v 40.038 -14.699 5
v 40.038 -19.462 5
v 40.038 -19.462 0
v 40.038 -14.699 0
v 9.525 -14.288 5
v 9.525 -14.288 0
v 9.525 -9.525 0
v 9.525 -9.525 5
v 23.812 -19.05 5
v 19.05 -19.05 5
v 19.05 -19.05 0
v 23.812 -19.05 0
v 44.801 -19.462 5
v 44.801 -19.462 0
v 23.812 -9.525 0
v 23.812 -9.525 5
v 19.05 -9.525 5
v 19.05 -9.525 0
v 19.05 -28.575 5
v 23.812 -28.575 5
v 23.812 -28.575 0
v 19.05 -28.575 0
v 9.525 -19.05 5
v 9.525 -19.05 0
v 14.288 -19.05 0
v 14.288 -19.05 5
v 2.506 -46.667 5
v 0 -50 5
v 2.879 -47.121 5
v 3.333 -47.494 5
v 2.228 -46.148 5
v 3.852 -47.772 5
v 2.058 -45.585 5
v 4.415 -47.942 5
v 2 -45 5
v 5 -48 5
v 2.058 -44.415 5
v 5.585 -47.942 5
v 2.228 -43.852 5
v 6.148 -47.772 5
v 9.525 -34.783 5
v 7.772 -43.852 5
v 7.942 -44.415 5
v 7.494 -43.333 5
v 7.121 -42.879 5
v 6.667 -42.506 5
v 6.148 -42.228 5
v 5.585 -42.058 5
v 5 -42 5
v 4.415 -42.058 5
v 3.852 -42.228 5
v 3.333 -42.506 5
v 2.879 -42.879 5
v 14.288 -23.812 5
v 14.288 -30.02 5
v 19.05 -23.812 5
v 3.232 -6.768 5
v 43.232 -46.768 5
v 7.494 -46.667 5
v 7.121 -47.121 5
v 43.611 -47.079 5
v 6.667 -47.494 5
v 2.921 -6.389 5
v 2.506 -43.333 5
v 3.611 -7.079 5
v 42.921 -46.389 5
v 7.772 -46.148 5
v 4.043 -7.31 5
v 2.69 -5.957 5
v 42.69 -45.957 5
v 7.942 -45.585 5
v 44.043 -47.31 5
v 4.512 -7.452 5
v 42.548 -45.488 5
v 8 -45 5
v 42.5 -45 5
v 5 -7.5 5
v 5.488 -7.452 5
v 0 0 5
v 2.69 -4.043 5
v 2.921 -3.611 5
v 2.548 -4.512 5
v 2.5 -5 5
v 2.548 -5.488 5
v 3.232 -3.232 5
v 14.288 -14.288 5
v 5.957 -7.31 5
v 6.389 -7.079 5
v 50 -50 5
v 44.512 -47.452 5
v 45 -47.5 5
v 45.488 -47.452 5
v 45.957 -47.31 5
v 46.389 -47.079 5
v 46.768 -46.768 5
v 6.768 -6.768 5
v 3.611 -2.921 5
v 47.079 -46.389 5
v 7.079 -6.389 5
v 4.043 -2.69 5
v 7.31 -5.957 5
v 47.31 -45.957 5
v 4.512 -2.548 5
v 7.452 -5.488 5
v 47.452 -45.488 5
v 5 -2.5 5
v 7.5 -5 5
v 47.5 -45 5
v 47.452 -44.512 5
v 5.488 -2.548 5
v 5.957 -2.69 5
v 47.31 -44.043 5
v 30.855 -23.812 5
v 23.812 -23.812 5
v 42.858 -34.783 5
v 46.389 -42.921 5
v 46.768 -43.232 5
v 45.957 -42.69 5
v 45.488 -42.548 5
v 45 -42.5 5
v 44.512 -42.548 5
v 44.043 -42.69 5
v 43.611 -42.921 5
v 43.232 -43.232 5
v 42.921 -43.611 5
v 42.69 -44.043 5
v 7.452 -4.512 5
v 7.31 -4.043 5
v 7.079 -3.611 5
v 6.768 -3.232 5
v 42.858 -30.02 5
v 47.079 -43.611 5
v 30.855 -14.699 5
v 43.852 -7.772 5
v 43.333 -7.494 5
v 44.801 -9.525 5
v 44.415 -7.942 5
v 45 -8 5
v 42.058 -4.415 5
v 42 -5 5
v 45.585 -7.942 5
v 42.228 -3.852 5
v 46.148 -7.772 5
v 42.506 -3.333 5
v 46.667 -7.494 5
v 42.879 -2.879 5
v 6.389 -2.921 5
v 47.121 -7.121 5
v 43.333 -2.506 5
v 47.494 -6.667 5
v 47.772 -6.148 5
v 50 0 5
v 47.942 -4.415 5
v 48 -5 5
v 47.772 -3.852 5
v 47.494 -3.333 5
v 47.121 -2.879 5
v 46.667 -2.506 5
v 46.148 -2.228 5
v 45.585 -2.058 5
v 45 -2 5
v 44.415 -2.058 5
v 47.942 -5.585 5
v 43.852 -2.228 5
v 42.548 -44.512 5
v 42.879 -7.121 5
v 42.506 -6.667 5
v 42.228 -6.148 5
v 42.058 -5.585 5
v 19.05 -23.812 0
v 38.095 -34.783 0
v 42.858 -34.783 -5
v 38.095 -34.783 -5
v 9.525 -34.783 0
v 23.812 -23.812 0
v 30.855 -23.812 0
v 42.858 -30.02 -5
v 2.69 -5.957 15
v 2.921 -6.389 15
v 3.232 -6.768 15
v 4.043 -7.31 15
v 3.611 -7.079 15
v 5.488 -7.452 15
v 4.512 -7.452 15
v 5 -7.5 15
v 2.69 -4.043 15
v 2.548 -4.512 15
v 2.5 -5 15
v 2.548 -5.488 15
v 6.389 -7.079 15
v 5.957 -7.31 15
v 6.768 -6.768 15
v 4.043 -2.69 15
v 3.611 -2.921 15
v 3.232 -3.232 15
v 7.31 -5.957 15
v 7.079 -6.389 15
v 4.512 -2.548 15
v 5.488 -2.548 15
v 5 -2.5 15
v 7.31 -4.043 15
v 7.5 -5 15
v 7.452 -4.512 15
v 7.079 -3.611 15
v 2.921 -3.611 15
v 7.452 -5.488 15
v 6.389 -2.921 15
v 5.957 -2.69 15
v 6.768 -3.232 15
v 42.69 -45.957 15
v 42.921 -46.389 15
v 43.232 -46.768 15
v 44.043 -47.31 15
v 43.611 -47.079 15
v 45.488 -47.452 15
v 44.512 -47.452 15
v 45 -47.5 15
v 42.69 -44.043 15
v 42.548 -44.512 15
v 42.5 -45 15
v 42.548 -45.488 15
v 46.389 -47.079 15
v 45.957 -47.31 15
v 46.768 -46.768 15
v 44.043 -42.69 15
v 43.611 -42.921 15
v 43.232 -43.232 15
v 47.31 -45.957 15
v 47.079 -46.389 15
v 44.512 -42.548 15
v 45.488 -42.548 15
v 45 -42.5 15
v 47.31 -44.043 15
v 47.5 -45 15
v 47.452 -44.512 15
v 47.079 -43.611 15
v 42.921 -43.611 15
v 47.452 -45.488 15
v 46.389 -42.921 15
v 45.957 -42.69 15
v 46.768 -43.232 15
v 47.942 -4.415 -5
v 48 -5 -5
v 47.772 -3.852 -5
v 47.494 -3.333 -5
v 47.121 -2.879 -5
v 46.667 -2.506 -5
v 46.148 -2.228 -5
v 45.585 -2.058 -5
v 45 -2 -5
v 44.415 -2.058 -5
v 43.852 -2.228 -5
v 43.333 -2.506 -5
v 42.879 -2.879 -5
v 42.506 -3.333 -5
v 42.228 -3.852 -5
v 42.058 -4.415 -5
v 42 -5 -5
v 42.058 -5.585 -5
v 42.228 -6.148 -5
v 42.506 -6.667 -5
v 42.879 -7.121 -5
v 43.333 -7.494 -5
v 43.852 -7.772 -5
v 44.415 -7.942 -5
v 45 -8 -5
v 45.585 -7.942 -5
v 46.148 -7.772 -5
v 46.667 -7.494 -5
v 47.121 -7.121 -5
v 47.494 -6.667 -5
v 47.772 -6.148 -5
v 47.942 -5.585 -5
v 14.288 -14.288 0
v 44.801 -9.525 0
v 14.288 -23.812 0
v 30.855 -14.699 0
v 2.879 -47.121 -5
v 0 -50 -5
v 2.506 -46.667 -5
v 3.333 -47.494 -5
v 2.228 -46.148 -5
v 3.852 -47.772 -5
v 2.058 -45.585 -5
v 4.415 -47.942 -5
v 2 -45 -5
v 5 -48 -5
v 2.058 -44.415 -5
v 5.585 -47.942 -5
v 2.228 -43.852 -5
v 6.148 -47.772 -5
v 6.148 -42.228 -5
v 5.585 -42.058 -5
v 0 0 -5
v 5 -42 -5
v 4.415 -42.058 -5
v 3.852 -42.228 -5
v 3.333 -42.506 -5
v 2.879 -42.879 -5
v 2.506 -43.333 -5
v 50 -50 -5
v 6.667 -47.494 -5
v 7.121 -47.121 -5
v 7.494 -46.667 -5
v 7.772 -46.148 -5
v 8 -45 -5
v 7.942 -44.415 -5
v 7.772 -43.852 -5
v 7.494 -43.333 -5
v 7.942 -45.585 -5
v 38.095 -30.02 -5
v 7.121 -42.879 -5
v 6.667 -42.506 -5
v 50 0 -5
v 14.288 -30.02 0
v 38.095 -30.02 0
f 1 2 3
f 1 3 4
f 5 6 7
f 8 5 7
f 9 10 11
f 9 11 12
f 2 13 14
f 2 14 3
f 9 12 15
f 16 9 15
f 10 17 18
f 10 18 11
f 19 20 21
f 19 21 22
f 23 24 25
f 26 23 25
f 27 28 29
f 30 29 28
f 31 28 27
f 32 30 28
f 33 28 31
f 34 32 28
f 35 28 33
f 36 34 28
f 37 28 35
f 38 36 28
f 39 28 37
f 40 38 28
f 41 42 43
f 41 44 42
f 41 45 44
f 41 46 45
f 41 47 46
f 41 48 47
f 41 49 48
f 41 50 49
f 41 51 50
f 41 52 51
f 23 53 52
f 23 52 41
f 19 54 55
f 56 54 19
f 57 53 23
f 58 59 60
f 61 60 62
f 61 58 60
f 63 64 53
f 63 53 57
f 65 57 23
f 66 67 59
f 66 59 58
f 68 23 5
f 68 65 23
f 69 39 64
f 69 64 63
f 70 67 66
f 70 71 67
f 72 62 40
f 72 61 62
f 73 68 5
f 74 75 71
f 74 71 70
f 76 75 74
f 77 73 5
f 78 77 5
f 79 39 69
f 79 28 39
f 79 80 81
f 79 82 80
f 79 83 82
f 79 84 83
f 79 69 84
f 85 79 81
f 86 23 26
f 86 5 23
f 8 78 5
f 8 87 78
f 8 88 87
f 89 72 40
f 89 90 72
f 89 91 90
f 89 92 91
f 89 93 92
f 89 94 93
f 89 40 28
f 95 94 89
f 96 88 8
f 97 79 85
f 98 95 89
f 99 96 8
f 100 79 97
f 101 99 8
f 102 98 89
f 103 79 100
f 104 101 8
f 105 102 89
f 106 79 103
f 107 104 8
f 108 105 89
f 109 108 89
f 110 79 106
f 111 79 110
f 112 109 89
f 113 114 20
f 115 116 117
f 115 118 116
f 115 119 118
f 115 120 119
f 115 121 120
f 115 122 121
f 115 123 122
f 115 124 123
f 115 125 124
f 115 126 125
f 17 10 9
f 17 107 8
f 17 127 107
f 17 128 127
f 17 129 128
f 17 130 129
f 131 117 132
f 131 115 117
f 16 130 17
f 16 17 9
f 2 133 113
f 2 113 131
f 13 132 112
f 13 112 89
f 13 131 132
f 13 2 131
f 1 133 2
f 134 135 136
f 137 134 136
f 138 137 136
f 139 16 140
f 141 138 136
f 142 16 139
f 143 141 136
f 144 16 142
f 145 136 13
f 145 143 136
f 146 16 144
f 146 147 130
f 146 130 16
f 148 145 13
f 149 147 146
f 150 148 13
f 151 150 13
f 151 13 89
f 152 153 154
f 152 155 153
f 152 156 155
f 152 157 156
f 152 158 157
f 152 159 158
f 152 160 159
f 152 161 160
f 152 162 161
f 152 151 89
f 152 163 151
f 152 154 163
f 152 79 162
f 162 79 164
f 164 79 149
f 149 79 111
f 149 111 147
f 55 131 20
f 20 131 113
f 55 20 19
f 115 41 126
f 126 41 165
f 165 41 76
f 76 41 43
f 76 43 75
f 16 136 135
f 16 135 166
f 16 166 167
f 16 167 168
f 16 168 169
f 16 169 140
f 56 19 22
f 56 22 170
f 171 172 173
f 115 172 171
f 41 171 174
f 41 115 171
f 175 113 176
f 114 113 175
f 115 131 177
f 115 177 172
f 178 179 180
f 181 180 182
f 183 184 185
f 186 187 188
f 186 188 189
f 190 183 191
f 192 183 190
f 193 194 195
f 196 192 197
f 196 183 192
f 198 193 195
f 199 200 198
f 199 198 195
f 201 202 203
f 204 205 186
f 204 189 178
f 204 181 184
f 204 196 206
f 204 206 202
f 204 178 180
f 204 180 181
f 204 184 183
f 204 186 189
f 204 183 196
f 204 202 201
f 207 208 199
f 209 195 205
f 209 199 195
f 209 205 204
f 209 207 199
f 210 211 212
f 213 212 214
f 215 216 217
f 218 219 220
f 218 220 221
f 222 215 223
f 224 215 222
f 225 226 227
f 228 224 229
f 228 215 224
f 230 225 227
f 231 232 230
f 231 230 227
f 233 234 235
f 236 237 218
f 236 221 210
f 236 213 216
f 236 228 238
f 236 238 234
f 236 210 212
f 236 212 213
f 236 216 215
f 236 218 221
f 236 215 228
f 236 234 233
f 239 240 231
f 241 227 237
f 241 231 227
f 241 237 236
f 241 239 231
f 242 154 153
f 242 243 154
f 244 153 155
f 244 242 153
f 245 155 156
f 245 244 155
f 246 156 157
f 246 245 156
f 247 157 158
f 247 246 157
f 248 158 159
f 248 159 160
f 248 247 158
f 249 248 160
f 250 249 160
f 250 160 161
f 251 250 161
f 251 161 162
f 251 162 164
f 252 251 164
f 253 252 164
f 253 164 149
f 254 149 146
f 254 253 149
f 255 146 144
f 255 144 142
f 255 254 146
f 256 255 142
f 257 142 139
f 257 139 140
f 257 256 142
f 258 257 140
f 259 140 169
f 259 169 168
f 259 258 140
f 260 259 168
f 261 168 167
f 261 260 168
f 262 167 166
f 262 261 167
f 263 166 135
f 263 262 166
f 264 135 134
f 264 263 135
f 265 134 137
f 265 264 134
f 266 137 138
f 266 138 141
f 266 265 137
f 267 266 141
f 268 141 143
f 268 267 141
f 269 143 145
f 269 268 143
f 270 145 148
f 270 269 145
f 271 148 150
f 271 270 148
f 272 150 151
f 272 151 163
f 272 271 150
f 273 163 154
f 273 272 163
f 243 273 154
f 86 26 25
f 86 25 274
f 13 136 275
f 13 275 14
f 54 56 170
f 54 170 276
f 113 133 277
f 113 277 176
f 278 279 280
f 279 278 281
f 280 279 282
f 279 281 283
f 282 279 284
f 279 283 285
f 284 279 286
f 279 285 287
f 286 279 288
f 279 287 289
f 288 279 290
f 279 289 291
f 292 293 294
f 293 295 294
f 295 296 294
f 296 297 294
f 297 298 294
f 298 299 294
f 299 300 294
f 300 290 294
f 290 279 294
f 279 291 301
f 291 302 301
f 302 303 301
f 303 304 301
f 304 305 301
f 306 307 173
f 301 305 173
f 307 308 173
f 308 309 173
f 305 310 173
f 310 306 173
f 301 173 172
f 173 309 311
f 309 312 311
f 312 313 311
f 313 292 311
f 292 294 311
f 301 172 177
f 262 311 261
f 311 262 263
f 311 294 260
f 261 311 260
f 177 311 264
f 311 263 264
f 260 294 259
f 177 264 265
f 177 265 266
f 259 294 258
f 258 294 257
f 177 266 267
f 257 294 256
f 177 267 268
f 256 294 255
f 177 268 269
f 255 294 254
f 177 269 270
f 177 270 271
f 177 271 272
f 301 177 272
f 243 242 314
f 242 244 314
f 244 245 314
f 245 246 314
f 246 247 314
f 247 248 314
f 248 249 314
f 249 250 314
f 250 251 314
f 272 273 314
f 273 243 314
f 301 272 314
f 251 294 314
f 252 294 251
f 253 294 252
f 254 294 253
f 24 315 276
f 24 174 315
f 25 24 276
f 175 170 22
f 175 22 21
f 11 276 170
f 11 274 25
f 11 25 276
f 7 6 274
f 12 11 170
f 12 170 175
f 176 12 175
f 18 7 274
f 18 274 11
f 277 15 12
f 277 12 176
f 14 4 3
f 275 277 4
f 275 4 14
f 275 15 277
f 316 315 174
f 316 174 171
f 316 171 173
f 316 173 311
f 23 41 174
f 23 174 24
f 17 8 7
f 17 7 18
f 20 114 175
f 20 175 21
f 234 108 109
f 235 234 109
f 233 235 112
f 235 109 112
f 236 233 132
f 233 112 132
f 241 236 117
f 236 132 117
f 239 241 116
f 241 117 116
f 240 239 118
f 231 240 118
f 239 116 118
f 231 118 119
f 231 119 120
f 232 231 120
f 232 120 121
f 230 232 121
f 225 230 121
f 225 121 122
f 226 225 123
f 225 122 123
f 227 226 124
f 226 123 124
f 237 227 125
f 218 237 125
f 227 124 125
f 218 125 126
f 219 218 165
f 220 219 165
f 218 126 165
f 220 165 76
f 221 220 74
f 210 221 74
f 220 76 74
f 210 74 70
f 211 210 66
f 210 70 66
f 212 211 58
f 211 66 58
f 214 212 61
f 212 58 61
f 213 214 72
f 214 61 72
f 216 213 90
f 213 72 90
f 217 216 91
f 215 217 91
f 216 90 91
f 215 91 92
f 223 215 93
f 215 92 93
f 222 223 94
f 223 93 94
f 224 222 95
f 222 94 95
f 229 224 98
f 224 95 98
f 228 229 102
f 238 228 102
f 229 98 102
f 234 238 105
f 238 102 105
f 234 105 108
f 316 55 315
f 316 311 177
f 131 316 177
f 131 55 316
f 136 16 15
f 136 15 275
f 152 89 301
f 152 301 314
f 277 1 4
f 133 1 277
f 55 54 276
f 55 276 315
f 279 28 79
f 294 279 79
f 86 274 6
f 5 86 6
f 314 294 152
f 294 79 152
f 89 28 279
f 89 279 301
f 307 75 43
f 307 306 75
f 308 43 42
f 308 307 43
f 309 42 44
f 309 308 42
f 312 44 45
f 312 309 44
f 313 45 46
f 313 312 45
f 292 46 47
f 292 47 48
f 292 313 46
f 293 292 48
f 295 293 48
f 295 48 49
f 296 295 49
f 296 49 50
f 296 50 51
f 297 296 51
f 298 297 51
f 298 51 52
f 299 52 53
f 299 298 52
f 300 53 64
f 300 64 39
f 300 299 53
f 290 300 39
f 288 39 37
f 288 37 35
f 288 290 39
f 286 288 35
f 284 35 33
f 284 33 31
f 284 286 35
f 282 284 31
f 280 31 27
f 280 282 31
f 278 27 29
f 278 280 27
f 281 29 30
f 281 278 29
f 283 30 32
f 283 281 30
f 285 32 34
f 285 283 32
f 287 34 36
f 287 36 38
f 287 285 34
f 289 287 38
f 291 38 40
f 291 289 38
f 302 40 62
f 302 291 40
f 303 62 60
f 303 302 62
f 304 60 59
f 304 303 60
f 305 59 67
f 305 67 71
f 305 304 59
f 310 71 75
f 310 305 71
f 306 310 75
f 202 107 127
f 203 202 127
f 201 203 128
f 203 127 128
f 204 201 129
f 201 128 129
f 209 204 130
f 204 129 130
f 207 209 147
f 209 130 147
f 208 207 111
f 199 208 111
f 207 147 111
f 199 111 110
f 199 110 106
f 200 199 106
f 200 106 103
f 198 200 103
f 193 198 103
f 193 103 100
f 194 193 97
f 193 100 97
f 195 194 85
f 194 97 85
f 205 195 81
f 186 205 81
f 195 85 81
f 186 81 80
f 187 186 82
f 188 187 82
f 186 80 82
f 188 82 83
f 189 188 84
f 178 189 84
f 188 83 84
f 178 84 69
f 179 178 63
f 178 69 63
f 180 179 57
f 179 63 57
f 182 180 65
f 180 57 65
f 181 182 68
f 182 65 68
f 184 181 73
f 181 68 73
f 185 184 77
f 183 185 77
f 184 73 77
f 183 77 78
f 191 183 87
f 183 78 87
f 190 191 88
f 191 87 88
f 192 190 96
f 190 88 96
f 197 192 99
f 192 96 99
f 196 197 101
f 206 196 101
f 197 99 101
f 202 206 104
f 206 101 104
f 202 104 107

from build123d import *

# Parameters (mm, degrees)
F0_W     = 50
F0_H     = 50
F0_R     = 3
F1_DEPTH = 5
F2_DEPTH = 5
F3_R     = 2.5
F4_DEPTH = 10


with BuildPart() as f1:
    # F0 (on Top) → F1 (new body, symmetric)
    with BuildSketch(Plane.XY):
        with Locations((25, -25)):
            Rectangle(F0_W, F0_H)
        with Locations((5, -45)):
            Circle(F0_R, mode=Mode.SUBTRACT)
        Polygon((14.2875, -30.020106), (38.09502, -30.020106), (42.85752, -30.020106), (42.85752, -34.782606), (38.09502, -34.782606), (9.525, -34.782606), (9.525, -28.575), (9.525, -19.05), (14.2875, -19.05), (14.2875, -14.2875), (9.525, -14.2875), (9.525, -9.525), (19.05, -9.525), (19.05, -19.05), (23.8125, -19.05), (23.8125, -9.525), (28.575, -9.525), (38.80062, -9.525), (44.80062, -9.525), (44.80062, -19.461621), (40.03812, -19.461621), (40.03812, -14.699121), (30.854725, -14.699121), (30.854725, -19.461621), (30.854725, -23.8125), (23.8125, -23.8125), (23.8125, -28.575), (19.05, -28.575), (19.05, -23.8125), (14.2875, -23.8125), (14.2875, -28.575), align=None, mode=Mode.SUBTRACT)
        with Locations((45, -5)):
            Circle(F0_R, mode=Mode.SUBTRACT)
    extrude(amount=F1_DEPTH, both=True)

    # F0 (on Top) → F2 (join)
    with BuildSketch(Plane.XY):
        Polygon((38.09502, -34.782606), (38.09502, -30.020106), (14.2875, -30.020106), (14.2875, -28.575), (14.2875, -23.8125), (19.05, -23.8125), (19.05, -28.575), (23.8125, -28.575), (23.8125, -23.8125), (30.854725, -23.8125), (30.854725, -19.461621), (30.854725, -14.699121), (40.03812, -14.699121), (40.03812, -19.461621), (44.80062, -19.461621), (44.80062, -9.525), (38.80062, -9.525), (28.575, -9.525), (23.8125, -9.525), (23.8125, -19.05), (19.05, -19.05), (19.05, -9.525), (9.525, -9.525), (9.525, -14.2875), (14.2875, -14.2875), (14.2875, -19.05), (9.525, -19.05), (9.525, -28.575), (9.525, -34.782606), align=None)
    extrude(amount=-F2_DEPTH)

    # F3 (on face) → F4 (join)
    with BuildSketch(Plane.XY.offset(5)):
        with Locations((5, -5)):
            Circle(F3_R)
        with Locations((45, -45)):
            Circle(F3_R)
    extrude(amount=F4_DEPTH)


solid = f1.part
